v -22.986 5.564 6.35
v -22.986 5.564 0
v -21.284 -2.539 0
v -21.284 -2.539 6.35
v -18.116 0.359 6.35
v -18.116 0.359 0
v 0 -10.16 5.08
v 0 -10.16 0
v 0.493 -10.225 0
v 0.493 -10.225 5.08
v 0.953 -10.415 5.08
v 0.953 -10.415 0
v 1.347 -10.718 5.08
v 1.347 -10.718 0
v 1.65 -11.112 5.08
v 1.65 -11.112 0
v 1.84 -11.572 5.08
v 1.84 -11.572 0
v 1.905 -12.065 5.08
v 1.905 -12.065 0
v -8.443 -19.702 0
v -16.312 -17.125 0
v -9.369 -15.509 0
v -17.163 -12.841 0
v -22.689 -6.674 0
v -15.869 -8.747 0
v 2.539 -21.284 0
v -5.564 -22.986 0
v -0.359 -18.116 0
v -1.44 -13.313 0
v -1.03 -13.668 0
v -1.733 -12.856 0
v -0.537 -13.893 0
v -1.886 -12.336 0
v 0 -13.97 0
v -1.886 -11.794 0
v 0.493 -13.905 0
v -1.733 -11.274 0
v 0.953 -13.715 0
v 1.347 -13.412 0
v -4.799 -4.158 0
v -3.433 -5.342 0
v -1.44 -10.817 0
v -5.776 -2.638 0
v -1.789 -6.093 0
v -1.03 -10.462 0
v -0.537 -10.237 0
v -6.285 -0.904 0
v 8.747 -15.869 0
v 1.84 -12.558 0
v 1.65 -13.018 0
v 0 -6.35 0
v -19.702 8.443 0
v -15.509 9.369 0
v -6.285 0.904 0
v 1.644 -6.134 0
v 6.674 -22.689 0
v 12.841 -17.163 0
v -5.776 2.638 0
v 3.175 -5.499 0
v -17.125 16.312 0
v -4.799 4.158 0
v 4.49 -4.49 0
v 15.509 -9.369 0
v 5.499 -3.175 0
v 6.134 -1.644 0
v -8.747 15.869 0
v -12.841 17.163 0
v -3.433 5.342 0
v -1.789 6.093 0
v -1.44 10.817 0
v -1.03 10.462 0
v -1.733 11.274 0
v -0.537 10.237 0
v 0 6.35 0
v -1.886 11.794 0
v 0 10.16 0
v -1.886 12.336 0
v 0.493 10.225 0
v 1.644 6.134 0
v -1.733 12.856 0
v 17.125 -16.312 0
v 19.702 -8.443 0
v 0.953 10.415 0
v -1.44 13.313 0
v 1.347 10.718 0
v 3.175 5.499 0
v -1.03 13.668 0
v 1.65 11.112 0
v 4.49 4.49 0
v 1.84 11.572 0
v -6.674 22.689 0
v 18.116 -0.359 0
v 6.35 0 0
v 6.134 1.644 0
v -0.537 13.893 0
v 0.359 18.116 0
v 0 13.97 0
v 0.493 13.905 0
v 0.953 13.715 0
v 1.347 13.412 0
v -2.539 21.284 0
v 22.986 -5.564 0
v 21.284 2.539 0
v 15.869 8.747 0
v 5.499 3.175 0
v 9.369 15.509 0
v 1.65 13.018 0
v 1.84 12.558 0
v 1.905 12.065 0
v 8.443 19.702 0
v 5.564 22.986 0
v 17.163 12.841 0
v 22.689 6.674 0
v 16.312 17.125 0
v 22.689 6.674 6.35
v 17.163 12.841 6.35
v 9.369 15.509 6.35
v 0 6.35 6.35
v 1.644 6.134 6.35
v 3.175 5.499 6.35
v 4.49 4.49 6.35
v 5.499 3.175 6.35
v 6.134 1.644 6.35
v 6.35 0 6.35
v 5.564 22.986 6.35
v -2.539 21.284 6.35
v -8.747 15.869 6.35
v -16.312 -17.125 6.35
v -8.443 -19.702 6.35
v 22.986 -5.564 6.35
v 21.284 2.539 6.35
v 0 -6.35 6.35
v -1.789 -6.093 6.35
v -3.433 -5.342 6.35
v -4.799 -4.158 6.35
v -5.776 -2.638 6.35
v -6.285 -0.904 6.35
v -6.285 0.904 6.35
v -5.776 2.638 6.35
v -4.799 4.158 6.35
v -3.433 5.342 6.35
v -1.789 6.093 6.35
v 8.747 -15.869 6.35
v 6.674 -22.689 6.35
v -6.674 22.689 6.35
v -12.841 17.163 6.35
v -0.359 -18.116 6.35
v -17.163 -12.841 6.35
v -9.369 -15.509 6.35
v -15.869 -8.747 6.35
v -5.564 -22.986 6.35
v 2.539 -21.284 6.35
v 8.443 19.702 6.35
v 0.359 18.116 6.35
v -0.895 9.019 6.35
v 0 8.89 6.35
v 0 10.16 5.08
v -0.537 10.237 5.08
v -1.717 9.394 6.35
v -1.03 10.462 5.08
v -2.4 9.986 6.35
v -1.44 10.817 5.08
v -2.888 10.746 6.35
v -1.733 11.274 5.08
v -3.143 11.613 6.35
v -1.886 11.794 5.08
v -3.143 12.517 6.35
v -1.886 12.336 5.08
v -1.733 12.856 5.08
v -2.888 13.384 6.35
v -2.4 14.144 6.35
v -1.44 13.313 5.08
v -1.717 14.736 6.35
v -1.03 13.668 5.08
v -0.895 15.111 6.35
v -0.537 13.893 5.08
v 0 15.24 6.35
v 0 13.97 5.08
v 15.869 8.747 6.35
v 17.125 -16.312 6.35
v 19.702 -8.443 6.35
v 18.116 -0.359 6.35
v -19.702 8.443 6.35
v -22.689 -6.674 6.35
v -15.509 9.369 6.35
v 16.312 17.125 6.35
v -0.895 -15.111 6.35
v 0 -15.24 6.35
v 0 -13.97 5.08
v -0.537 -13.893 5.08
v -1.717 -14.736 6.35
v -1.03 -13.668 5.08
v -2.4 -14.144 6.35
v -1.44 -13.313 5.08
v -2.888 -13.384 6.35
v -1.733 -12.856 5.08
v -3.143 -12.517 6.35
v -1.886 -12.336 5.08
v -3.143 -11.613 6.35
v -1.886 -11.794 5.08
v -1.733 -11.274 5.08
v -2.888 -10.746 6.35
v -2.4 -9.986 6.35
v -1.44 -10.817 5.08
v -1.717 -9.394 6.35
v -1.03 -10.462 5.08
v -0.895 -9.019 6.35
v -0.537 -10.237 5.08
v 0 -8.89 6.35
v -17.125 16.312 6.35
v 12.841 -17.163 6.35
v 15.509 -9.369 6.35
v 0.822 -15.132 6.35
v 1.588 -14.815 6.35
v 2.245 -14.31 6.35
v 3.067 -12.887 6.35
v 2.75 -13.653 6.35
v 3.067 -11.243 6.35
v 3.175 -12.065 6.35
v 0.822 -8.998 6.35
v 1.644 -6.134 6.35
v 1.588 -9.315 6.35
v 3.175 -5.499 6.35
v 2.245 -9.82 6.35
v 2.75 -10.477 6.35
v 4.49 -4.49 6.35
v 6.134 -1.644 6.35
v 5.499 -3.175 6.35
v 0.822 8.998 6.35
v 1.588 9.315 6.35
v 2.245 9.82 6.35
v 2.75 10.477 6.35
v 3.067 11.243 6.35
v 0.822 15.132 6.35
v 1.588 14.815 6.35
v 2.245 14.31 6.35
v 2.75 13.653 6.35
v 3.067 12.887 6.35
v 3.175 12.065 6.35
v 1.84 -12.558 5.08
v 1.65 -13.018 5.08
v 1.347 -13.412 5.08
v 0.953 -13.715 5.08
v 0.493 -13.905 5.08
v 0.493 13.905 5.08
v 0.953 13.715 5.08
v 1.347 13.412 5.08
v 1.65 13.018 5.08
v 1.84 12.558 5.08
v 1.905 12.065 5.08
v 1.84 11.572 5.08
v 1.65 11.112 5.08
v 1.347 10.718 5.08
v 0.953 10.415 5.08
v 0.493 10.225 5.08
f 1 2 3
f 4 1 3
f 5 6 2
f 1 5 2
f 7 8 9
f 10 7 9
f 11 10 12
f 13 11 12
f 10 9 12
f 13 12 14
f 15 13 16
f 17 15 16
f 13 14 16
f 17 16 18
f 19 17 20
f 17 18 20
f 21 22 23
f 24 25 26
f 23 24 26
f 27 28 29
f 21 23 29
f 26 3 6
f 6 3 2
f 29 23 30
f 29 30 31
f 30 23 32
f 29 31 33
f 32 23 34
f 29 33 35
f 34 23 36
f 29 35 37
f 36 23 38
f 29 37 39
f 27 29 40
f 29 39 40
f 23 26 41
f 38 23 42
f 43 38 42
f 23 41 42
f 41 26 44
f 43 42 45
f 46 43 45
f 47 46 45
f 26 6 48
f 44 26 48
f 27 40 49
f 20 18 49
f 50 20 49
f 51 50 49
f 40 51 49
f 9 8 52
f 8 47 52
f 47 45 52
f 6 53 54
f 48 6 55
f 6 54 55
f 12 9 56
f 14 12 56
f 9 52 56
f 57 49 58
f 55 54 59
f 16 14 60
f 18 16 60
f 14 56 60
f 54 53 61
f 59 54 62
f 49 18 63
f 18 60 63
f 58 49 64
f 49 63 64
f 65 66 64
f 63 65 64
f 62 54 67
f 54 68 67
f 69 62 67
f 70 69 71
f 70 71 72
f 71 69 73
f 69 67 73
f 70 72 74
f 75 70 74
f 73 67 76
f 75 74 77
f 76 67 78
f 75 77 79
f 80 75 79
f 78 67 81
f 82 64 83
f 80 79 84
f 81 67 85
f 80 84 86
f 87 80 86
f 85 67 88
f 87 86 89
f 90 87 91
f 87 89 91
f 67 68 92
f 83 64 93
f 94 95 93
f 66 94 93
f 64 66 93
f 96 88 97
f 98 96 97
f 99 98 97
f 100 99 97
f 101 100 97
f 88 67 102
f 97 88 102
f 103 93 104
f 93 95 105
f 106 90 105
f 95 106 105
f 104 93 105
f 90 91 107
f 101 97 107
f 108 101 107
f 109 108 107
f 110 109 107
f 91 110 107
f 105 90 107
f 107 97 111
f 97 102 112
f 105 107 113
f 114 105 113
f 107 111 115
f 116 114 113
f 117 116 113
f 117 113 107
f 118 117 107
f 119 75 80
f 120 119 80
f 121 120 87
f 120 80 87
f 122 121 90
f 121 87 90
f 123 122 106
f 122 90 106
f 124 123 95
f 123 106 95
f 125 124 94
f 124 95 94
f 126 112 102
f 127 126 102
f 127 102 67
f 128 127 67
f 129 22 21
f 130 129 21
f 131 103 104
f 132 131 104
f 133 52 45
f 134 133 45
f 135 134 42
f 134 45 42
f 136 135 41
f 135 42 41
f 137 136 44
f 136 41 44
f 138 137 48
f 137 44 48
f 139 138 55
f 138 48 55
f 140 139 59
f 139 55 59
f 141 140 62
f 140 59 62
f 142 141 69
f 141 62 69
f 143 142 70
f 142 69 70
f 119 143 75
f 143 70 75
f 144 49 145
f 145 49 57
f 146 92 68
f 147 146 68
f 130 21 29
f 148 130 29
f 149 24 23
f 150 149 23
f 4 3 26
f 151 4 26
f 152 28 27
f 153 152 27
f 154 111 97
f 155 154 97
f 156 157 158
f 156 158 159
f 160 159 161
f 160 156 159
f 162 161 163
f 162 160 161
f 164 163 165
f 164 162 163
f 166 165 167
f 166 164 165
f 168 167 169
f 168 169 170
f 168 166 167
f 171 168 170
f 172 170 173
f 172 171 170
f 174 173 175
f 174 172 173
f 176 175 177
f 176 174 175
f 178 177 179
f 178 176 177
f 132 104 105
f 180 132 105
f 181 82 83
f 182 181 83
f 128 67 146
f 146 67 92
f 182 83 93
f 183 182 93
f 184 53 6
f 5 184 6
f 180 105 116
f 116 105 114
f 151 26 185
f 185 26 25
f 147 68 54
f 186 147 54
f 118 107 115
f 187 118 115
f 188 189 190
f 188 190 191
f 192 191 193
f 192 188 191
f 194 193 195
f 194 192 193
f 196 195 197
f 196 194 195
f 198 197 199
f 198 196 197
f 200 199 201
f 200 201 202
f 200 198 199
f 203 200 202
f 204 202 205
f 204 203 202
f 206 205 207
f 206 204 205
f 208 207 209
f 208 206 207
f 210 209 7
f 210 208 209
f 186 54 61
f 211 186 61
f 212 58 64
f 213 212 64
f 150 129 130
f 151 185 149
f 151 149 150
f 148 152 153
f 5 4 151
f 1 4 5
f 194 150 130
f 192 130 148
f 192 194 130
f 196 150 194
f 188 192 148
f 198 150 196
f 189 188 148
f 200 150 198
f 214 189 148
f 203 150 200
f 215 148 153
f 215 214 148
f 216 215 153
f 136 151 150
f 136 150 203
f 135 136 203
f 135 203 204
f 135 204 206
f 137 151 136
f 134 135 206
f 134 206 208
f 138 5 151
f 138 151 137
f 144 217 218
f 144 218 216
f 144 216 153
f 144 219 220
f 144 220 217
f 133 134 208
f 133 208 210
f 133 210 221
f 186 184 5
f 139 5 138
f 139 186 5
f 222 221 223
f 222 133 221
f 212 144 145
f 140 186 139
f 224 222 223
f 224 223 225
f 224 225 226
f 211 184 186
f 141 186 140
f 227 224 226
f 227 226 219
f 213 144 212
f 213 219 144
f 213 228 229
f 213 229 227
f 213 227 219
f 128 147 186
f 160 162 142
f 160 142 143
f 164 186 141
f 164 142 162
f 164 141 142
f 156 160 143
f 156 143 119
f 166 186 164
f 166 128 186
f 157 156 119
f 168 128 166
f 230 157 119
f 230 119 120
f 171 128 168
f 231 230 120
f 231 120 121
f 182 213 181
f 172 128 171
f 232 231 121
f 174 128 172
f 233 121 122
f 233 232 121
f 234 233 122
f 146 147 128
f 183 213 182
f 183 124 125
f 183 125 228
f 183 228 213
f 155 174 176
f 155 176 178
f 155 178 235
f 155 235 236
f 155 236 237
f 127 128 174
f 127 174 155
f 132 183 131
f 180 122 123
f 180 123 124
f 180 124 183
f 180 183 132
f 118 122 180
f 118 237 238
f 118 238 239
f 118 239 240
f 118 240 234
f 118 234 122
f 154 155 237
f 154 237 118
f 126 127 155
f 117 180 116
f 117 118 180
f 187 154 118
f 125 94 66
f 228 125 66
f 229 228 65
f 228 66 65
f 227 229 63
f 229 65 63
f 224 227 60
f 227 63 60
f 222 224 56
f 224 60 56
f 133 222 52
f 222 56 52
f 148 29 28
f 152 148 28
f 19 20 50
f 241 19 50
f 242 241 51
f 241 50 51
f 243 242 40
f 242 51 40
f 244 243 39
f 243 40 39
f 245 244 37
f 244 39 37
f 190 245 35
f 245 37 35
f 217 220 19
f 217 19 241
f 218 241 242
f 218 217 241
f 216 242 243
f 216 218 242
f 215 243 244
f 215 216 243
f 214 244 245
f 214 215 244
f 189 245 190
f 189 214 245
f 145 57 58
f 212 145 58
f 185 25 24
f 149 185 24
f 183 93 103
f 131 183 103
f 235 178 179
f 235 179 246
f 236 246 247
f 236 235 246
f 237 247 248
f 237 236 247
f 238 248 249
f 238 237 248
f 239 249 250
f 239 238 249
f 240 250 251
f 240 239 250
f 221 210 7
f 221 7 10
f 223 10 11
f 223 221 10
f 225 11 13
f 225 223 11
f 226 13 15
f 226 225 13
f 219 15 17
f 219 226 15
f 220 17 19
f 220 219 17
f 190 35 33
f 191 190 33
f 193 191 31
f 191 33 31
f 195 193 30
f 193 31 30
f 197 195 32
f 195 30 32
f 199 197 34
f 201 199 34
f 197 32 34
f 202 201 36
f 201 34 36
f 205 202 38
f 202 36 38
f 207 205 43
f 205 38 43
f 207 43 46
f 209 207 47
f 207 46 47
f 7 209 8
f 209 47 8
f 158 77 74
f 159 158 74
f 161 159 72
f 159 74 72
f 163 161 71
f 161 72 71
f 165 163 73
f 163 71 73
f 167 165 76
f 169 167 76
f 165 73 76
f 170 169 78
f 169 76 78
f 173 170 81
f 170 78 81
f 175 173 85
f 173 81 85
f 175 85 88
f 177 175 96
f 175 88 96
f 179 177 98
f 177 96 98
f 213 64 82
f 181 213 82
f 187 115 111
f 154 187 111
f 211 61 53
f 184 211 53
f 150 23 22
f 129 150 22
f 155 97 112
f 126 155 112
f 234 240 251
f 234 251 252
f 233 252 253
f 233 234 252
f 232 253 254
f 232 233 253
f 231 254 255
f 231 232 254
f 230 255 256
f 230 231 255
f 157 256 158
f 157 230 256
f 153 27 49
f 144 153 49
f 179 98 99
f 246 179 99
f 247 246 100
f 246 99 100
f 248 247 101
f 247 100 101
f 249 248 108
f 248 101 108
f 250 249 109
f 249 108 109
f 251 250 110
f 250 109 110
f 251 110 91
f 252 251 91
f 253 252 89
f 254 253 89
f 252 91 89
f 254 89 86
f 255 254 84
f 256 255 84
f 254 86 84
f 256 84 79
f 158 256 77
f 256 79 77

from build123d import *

# Parameters (mm, degrees)
F1_DEPTH = 6.35
F2_SIZE  = 1.27


# Not quite as in the source:
# - a feature names something its author has since deleted; it is built from what else it names


with BuildPart() as f1:
    # F0 (on Top) → F1 (new body)
    with BuildSketch(Plane.XY):
        with BuildLine():
            ThreePointArc((16.2360474276, -7.2470106892), (17.3897286244, -3.7048263615), (17.78, 0))
            ThreePointArc((17.78, 0), (17.7560676116, 0.9222054927), (17.6843348739, 1.8419283555))
            ThreePointArc((17.6843348739, 1.8419283555), (16.9123599344, 5.4863905666), (15.3979316793, 8.89))
            ThreePointArc((15.3979316793, 8.89), (14.9161028766, 9.67668719), (14.3941190721, 10.4373241848))
            ThreePointArc((14.3941190721, 10.4373241848), (11.9033380579, 13.2075335729), (8.89, 15.3979316793))
            ThreePointArc((8.89, 15.3979316793), (8.0793804216, 15.8383083694), (7.2470106892, 16.2360474276))
            ThreePointArc((7.2470106892, 16.2360474276), (3.7048263615, 17.3897286244), (0, 17.78))
            Line((0, 17.78), (0, 13.97))
            ThreePointArc((0, 13.97), (1.3470384182, 13.4120384182), (1.905, 12.065))
            ThreePointArc((1.905, 12.065), (1.3470384182, 10.7179615818), (0, 10.16))
            Line((0, 10.16), (0, 6.35))
            ThreePointArc((0, 6.35), (4.4901280605, 4.4901280605), (6.35, 0))
            ThreePointArc((6.35, 0), (4.4901280605, -4.4901280605), (0, -6.35))
            Line((0, -6.35), (0, -10.16))
            ThreePointArc((0, -10.16), (1.3470384182, -10.7179615818), (1.905, -12.065))
            ThreePointArc((1.905, -12.065), (1.3470384182, -13.4120384182), (0, -13.97))
            Line((0, -13.97), (0, -17.78))
            ThreePointArc((0, -17.78), (0.9222054927, -17.7560676116), (1.8419283555, -17.6843348739))
            ThreePointArc((1.8419283555, -17.6843348739), (5.4863905666, -16.9123599344), (8.89, -15.3979316793))
            ThreePointArc((8.89, -15.3979316793), (9.67668719, -14.9161028766), (10.4373241848, -14.3941190721))
            ThreePointArc((10.4373241848, -14.3941190721), (13.2075335729, -11.9033380579), (15.3979316793, -8.89))
            ThreePointArc((15.3979316793, -8.89), (15.8383083694, -8.0793804216), (16.2360474276, -7.2470106892))
        make_face()
        with BuildLine():
            Line((18.1161912512, -0.3593002622), (17.78, 0))
            ThreePointArc((17.78, 0), (17.3897286244, -3.7048263615), (16.2360474276, -7.2470106892))
            Line((16.2360474276, -7.2470106892), (15.5094317122, -9.3692587802))
            Line((15.5094317122, -9.3692587802), (17.1246183088, -16.3117890891))
            Line((17.1246183088, -16.3117890891), (19.7021180322, -8.4429771511))
            Line((19.7021180322, -8.4429771511), (18.1161912512, -0.3593002622))
        make_face()
        with BuildLine():
            ThreePointArc((17.6843348739, 1.8419283555), (17.7560676116, 0.9222054927), (17.78, 0))
            Line((17.78, 0), (18.1161912512, -0.3593002622))
            Line((18.1161912512, -0.3593002622), (17.6843348739, 1.8419283555))
        make_face()
        with BuildLine():
            ThreePointArc((15.3979316793, 8.89), (16.9123599344, 5.4863905666), (17.6843348739, 1.8419283555))
            Line((17.6843348739, 1.8419283555), (18.1161912512, -0.3593002622))
            Line((18.1161912512, -0.3593002622), (22.9862490301, -5.564114578))
            Line((22.9862490301, -5.564114578), (21.2840232998, 2.5392263196))
            Line((21.2840232998, 2.5392263196), (15.8687319744, 8.7469324709))
            Line((15.8687319744, 8.7469324709), (15.3979316793, 8.89))
        make_face()
        with BuildLine():
            Line((15.5094317122, -9.3692587802), (16.2360474276, -7.2470106892))
            ThreePointArc((16.2360474276, -7.2470106892), (15.8383083694, -8.0793804216), (15.3979316793, -8.89))
            Line((15.3979316793, -8.89), (15.5094317122, -9.3692587802))
        make_face()
        with BuildLine():
            ThreePointArc((14.3941190721, 10.4373241848), (14.9161028766, 9.67668719), (15.3979316793, 8.89))
            Line((15.3979316793, 8.89), (15.8687319744, 8.7469324709))
            Line((15.8687319744, 8.7469324709), (14.3941190721, 10.4373241848))
        make_face()
        with BuildLine():
            Line((15.5094317122, -9.3692587802), (15.3979316793, -8.89))
            ThreePointArc((15.3979316793, -8.89), (13.2075335729, -11.9033380579), (10.4373241848, -14.3941190721))
            Line((10.4373241848, -14.3941190721), (8.7469324709, -15.8687319744))
            Line((8.7469324709, -15.8687319744), (6.674459941, -22.6887328868))
            Line((6.674459941, -22.6887328868), (12.8410461487, -17.1628917126))
            Line((12.8410461487, -17.1628917126), (15.5094317122, -9.3692587802))
        make_face()
        with BuildLine():
            ThreePointArc((8.89, 15.3979316793), (11.9033380579, 13.2075335729), (14.3941190721, 10.4373241848))
            Line((14.3941190721, 10.4373241848), (15.8687319744, 8.7469324709))
            Line((15.8687319744, 8.7469324709), (22.6887328868, 6.674459941))
            Line((22.6887328868, 6.674459941), (17.1628917126, 12.8410461487))
            Line((17.1628917126, 12.8410461487), (9.3692587802, 15.5094317122))
            Line((9.3692587802, 15.5094317122), (8.89, 15.3979316793))
        make_face()
        with BuildLine():
            Line((8.7469324709, -15.8687319744), (10.4373241848, -14.3941190721))
            ThreePointArc((10.4373241848, -14.3941190721), (9.67668719, -14.9161028766), (8.89, -15.3979316793))
            Line((8.89, -15.3979316793), (8.7469324709, -15.8687319744))
        make_face()
        with BuildLine():
            ThreePointArc((7.2470106892, 16.2360474276), (8.0793804216, 15.8383083694), (8.89, 15.3979316793))
            Line((8.89, 15.3979316793), (9.3692587802, 15.5094317122))
            Line((9.3692587802, 15.5094317122), (7.2470106892, 16.2360474276))
        make_face()
        with BuildLine():
            Line((8.7469324709, -15.8687319744), (8.89, -15.3979316793))
            ThreePointArc((8.89, -15.3979316793), (5.4863905666, -16.9123599344), (1.8419283555, -17.6843348739))
            Line((1.8419283555, -17.6843348739), (-0.3593002622, -18.1161912512))
            Line((-0.3593002622, -18.1161912512), (-5.564114578, -22.9862490301))
            Line((-5.564114578, -22.9862490301), (2.5392263196, -21.2840232998))
            Line((2.5392263196, -21.2840232998), (8.7469324709, -15.8687319744))
        make_face()
        with BuildLine():
            ThreePointArc((0, 17.78), (3.7048263615, 17.3897286244), (7.2470106892, 16.2360474276))
            Line((7.2470106892, 16.2360474276), (9.3692587802, 15.5094317122))
            Line((9.3692587802, 15.5094317122), (16.3117890891, 17.1246183088))
            Line((16.3117890891, 17.1246183088), (8.4429771511, 19.7021180322))
            Line((8.4429771511, 19.7021180322), (0.3593002622, 18.1161912512))
            Line((0.3593002622, 18.1161912512), (0, 17.78))
        make_face()
        with BuildLine():
            Line((-0.3593002622, -18.1161912512), (1.8419283555, -17.6843348739))
            ThreePointArc((1.8419283555, -17.6843348739), (0.9222054927, -17.7560676116), (0, -17.78))
            Line((0, -17.78), (-0.3593002622, -18.1161912512))
        make_face()
        with BuildLine():
            Line((0, 13.97), (0, 17.78))
            ThreePointArc((0, 17.78), (-0.9222054927, 17.7560676116), (-1.8419283555, 17.6843348739))
            ThreePointArc((-1.8419283555, 17.6843348739), (-5.4863905666, 16.9123599344), (-8.89, 15.3979316793))
            ThreePointArc((-8.89, 15.3979316793), (-9.67668719, 14.9161028766), (-10.4373241848, 14.3941190721))
            ThreePointArc((-10.4373241848, 14.3941190721), (-13.2075335729, 11.9033380579), (-15.3979316793, 8.89))
            ThreePointArc((-15.3979316793, 8.89), (-15.8383083694, 8.0793804216), (-16.2360474276, 7.2470106892))
            ThreePointArc((-16.2360474276, 7.2470106892), (-17.3897286244, 3.7048263615), (-17.78, 0))
            ThreePointArc((-17.78, 0), (-17.7560676116, -0.9222054927), (-17.6843348739, -1.8419283555))
            ThreePointArc((-17.6843348739, -1.8419283555), (-16.9123599344, -5.4863905666), (-15.3979316793, -8.89))
            ThreePointArc((-15.3979316793, -8.89), (-14.9161028766, -9.67668719), (-14.3941190721, -10.4373241848))
            ThreePointArc((-14.3941190721, -10.4373241848), (-11.9033380579, -13.2075335729), (-8.89, -15.3979316793))
            ThreePointArc((-8.89, -15.3979316793), (-8.0793804216, -15.8383083694), (-7.2470106892, -16.2360474276))
            ThreePointArc((-7.2470106892, -16.2360474276), (-3.7048263615, -17.3897286244), (0, -17.78))
            Line((0, -17.78), (0, -13.97))
            ThreePointArc((0, -13.97), (-1.905, -12.065), (0, -10.16))
            Line((0, -10.16), (0, -6.35))
            ThreePointArc((0, -6.35), (-6.35, 0), (0, 6.35))
            Line((0, 6.35), (0, 10.16))
            ThreePointArc((0, 10.16), (-1.905, 12.065), (0, 13.97))
        make_face()
        with BuildLine():
            ThreePointArc((-1.8419283555, 17.6843348739), (-0.9222054927, 17.7560676116), (0, 17.78))
            Line((0, 17.78), (0.3593002622, 18.1161912512))
            Line((0.3593002622, 18.1161912512), (-1.8419283555, 17.6843348739))
        make_face()
        with BuildLine():
            Line((-0.3593002622, -18.1161912512), (0, -17.78))
            ThreePointArc((0, -17.78), (-3.7048263615, -17.3897286244), (-7.2470106892, -16.2360474276))
            Line((-7.2470106892, -16.2360474276), (-9.3692587802, -15.5094317122))
            Line((-9.3692587802, -15.5094317122), (-16.3117890891, -17.1246183088))
            Line((-16.3117890891, -17.1246183088), (-8.4429771511, -19.7021180322))
            Line((-8.4429771511, -19.7021180322), (-0.3593002622, -18.1161912512))
        make_face()
        with BuildLine():
            ThreePointArc((-8.89, 15.3979316793), (-5.4863905666, 16.9123599344), (-1.8419283555, 17.6843348739))
            Line((-1.8419283555, 17.6843348739), (0.3593002622, 18.1161912512))
            Line((0.3593002622, 18.1161912512), (5.564114578, 22.9862490301))
            Line((5.564114578, 22.9862490301), (-2.5392263196, 21.2840232998))
            Line((-2.5392263196, 21.2840232998), (-8.7469324709, 15.8687319744))
            Line((-8.7469324709, 15.8687319744), (-8.89, 15.3979316793))
        make_face()
        with BuildLine():
            Line((-9.3692587802, -15.5094317122), (-7.2470106892, -16.2360474276))
            ThreePointArc((-7.2470106892, -16.2360474276), (-8.0793804216, -15.8383083694), (-8.89, -15.3979316793))
            Line((-8.89, -15.3979316793), (-9.3692587802, -15.5094317122))
        make_face()
        with BuildLine():
            ThreePointArc((-10.4373241848, 14.3941190721), (-9.67668719, 14.9161028766), (-8.89, 15.3979316793))
            Line((-8.89, 15.3979316793), (-8.7469324709, 15.8687319744))
            Line((-8.7469324709, 15.8687319744), (-10.4373241848, 14.3941190721))
        make_face()
        with BuildLine():
            Line((-9.3692587802, -15.5094317122), (-8.89, -15.3979316793))
            ThreePointArc((-8.89, -15.3979316793), (-11.9033380579, -13.2075335729), (-14.3941190721, -10.4373241848))
            Line((-14.3941190721, -10.4373241848), (-15.8687319744, -8.7469324709))
            Line((-15.8687319744, -8.7469324709), (-22.6887328868, -6.674459941))
            Line((-22.6887328868, -6.674459941), (-17.1628917126, -12.8410461487))
            Line((-17.1628917126, -12.8410461487), (-9.3692587802, -15.5094317122))
        make_face()
        with BuildLine():
            ThreePointArc((-15.3979316793, 8.89), (-13.2075335729, 11.9033380579), (-10.4373241848, 14.3941190721))
            Line((-10.4373241848, 14.3941190721), (-8.7469324709, 15.8687319744))
            Line((-8.7469324709, 15.8687319744), (-6.674459941, 22.6887328868))
            Line((-6.674459941, 22.6887328868), (-12.8410461487, 17.1628917126))
            Line((-12.8410461487, 17.1628917126), (-15.5094317122, 9.3692587802))
            Line((-15.5094317122, 9.3692587802), (-15.3979316793, 8.89))
        make_face()
        with BuildLine():
            Line((-15.8687319744, -8.7469324709), (-14.3941190721, -10.4373241848))
            ThreePointArc((-14.3941190721, -10.4373241848), (-14.9161028766, -9.67668719), (-15.3979316793, -8.89))
            Line((-15.3979316793, -8.89), (-15.8687319744, -8.7469324709))
        make_face()
        with BuildLine():
            ThreePointArc((-16.2360474276, 7.2470106892), (-15.8383083694, 8.0793804216), (-15.3979316793, 8.89))
            Line((-15.3979316793, 8.89), (-15.5094317122, 9.3692587802))
            Line((-15.5094317122, 9.3692587802), (-16.2360474276, 7.2470106892))
        make_face()
        with BuildLine():
            Line((-15.8687319744, -8.7469324709), (-15.3979316793, -8.89))
            ThreePointArc((-15.3979316793, -8.89), (-16.9123599344, -5.4863905666), (-17.6843348739, -1.8419283555))
            Line((-17.6843348739, -1.8419283555), (-18.1161912512, 0.3593002622))
            Line((-18.1161912512, 0.3593002622), (-22.9862490301, 5.564114578))
            Line((-22.9862490301, 5.564114578), (-21.2840232998, -2.5392263196))
            Line((-21.2840232998, -2.5392263196), (-15.8687319744, -8.7469324709))
        make_face()
        with BuildLine():
            ThreePointArc((-17.78, 0), (-17.3897286244, 3.7048263615), (-16.2360474276, 7.2470106892))
            Line((-16.2360474276, 7.2470106892), (-15.5094317122, 9.3692587802))
            Line((-15.5094317122, 9.3692587802), (-17.1246183088, 16.3117890891))
            Line((-17.1246183088, 16.3117890891), (-19.7021180322, 8.4429771511))
            Line((-19.7021180322, 8.4429771511), (-18.1161912512, 0.3593002622))
            Line((-18.1161912512, 0.3593002622), (-17.78, 0))
        make_face()
        with BuildLine():
            Line((-18.1161912512, 0.3593002622), (-17.6843348739, -1.8419283555))
            ThreePointArc((-17.6843348739, -1.8419283555), (-17.7560676116, -0.9222054927), (-17.78, 0))
            Line((-17.78, 0), (-18.1161912512, 0.3593002622))
        make_face()
    extrude(amount=F1_DEPTH)

    # F2
    f2_edges = [f1.edges().sort_by_distance(p)[0] for p in [
        (-1.905, 12.065, 6.35),
        (-1.905, -12.065, 6.35),
    ]]
    chamfer(f2_edges, length=F2_SIZE)


solid = f1.part
